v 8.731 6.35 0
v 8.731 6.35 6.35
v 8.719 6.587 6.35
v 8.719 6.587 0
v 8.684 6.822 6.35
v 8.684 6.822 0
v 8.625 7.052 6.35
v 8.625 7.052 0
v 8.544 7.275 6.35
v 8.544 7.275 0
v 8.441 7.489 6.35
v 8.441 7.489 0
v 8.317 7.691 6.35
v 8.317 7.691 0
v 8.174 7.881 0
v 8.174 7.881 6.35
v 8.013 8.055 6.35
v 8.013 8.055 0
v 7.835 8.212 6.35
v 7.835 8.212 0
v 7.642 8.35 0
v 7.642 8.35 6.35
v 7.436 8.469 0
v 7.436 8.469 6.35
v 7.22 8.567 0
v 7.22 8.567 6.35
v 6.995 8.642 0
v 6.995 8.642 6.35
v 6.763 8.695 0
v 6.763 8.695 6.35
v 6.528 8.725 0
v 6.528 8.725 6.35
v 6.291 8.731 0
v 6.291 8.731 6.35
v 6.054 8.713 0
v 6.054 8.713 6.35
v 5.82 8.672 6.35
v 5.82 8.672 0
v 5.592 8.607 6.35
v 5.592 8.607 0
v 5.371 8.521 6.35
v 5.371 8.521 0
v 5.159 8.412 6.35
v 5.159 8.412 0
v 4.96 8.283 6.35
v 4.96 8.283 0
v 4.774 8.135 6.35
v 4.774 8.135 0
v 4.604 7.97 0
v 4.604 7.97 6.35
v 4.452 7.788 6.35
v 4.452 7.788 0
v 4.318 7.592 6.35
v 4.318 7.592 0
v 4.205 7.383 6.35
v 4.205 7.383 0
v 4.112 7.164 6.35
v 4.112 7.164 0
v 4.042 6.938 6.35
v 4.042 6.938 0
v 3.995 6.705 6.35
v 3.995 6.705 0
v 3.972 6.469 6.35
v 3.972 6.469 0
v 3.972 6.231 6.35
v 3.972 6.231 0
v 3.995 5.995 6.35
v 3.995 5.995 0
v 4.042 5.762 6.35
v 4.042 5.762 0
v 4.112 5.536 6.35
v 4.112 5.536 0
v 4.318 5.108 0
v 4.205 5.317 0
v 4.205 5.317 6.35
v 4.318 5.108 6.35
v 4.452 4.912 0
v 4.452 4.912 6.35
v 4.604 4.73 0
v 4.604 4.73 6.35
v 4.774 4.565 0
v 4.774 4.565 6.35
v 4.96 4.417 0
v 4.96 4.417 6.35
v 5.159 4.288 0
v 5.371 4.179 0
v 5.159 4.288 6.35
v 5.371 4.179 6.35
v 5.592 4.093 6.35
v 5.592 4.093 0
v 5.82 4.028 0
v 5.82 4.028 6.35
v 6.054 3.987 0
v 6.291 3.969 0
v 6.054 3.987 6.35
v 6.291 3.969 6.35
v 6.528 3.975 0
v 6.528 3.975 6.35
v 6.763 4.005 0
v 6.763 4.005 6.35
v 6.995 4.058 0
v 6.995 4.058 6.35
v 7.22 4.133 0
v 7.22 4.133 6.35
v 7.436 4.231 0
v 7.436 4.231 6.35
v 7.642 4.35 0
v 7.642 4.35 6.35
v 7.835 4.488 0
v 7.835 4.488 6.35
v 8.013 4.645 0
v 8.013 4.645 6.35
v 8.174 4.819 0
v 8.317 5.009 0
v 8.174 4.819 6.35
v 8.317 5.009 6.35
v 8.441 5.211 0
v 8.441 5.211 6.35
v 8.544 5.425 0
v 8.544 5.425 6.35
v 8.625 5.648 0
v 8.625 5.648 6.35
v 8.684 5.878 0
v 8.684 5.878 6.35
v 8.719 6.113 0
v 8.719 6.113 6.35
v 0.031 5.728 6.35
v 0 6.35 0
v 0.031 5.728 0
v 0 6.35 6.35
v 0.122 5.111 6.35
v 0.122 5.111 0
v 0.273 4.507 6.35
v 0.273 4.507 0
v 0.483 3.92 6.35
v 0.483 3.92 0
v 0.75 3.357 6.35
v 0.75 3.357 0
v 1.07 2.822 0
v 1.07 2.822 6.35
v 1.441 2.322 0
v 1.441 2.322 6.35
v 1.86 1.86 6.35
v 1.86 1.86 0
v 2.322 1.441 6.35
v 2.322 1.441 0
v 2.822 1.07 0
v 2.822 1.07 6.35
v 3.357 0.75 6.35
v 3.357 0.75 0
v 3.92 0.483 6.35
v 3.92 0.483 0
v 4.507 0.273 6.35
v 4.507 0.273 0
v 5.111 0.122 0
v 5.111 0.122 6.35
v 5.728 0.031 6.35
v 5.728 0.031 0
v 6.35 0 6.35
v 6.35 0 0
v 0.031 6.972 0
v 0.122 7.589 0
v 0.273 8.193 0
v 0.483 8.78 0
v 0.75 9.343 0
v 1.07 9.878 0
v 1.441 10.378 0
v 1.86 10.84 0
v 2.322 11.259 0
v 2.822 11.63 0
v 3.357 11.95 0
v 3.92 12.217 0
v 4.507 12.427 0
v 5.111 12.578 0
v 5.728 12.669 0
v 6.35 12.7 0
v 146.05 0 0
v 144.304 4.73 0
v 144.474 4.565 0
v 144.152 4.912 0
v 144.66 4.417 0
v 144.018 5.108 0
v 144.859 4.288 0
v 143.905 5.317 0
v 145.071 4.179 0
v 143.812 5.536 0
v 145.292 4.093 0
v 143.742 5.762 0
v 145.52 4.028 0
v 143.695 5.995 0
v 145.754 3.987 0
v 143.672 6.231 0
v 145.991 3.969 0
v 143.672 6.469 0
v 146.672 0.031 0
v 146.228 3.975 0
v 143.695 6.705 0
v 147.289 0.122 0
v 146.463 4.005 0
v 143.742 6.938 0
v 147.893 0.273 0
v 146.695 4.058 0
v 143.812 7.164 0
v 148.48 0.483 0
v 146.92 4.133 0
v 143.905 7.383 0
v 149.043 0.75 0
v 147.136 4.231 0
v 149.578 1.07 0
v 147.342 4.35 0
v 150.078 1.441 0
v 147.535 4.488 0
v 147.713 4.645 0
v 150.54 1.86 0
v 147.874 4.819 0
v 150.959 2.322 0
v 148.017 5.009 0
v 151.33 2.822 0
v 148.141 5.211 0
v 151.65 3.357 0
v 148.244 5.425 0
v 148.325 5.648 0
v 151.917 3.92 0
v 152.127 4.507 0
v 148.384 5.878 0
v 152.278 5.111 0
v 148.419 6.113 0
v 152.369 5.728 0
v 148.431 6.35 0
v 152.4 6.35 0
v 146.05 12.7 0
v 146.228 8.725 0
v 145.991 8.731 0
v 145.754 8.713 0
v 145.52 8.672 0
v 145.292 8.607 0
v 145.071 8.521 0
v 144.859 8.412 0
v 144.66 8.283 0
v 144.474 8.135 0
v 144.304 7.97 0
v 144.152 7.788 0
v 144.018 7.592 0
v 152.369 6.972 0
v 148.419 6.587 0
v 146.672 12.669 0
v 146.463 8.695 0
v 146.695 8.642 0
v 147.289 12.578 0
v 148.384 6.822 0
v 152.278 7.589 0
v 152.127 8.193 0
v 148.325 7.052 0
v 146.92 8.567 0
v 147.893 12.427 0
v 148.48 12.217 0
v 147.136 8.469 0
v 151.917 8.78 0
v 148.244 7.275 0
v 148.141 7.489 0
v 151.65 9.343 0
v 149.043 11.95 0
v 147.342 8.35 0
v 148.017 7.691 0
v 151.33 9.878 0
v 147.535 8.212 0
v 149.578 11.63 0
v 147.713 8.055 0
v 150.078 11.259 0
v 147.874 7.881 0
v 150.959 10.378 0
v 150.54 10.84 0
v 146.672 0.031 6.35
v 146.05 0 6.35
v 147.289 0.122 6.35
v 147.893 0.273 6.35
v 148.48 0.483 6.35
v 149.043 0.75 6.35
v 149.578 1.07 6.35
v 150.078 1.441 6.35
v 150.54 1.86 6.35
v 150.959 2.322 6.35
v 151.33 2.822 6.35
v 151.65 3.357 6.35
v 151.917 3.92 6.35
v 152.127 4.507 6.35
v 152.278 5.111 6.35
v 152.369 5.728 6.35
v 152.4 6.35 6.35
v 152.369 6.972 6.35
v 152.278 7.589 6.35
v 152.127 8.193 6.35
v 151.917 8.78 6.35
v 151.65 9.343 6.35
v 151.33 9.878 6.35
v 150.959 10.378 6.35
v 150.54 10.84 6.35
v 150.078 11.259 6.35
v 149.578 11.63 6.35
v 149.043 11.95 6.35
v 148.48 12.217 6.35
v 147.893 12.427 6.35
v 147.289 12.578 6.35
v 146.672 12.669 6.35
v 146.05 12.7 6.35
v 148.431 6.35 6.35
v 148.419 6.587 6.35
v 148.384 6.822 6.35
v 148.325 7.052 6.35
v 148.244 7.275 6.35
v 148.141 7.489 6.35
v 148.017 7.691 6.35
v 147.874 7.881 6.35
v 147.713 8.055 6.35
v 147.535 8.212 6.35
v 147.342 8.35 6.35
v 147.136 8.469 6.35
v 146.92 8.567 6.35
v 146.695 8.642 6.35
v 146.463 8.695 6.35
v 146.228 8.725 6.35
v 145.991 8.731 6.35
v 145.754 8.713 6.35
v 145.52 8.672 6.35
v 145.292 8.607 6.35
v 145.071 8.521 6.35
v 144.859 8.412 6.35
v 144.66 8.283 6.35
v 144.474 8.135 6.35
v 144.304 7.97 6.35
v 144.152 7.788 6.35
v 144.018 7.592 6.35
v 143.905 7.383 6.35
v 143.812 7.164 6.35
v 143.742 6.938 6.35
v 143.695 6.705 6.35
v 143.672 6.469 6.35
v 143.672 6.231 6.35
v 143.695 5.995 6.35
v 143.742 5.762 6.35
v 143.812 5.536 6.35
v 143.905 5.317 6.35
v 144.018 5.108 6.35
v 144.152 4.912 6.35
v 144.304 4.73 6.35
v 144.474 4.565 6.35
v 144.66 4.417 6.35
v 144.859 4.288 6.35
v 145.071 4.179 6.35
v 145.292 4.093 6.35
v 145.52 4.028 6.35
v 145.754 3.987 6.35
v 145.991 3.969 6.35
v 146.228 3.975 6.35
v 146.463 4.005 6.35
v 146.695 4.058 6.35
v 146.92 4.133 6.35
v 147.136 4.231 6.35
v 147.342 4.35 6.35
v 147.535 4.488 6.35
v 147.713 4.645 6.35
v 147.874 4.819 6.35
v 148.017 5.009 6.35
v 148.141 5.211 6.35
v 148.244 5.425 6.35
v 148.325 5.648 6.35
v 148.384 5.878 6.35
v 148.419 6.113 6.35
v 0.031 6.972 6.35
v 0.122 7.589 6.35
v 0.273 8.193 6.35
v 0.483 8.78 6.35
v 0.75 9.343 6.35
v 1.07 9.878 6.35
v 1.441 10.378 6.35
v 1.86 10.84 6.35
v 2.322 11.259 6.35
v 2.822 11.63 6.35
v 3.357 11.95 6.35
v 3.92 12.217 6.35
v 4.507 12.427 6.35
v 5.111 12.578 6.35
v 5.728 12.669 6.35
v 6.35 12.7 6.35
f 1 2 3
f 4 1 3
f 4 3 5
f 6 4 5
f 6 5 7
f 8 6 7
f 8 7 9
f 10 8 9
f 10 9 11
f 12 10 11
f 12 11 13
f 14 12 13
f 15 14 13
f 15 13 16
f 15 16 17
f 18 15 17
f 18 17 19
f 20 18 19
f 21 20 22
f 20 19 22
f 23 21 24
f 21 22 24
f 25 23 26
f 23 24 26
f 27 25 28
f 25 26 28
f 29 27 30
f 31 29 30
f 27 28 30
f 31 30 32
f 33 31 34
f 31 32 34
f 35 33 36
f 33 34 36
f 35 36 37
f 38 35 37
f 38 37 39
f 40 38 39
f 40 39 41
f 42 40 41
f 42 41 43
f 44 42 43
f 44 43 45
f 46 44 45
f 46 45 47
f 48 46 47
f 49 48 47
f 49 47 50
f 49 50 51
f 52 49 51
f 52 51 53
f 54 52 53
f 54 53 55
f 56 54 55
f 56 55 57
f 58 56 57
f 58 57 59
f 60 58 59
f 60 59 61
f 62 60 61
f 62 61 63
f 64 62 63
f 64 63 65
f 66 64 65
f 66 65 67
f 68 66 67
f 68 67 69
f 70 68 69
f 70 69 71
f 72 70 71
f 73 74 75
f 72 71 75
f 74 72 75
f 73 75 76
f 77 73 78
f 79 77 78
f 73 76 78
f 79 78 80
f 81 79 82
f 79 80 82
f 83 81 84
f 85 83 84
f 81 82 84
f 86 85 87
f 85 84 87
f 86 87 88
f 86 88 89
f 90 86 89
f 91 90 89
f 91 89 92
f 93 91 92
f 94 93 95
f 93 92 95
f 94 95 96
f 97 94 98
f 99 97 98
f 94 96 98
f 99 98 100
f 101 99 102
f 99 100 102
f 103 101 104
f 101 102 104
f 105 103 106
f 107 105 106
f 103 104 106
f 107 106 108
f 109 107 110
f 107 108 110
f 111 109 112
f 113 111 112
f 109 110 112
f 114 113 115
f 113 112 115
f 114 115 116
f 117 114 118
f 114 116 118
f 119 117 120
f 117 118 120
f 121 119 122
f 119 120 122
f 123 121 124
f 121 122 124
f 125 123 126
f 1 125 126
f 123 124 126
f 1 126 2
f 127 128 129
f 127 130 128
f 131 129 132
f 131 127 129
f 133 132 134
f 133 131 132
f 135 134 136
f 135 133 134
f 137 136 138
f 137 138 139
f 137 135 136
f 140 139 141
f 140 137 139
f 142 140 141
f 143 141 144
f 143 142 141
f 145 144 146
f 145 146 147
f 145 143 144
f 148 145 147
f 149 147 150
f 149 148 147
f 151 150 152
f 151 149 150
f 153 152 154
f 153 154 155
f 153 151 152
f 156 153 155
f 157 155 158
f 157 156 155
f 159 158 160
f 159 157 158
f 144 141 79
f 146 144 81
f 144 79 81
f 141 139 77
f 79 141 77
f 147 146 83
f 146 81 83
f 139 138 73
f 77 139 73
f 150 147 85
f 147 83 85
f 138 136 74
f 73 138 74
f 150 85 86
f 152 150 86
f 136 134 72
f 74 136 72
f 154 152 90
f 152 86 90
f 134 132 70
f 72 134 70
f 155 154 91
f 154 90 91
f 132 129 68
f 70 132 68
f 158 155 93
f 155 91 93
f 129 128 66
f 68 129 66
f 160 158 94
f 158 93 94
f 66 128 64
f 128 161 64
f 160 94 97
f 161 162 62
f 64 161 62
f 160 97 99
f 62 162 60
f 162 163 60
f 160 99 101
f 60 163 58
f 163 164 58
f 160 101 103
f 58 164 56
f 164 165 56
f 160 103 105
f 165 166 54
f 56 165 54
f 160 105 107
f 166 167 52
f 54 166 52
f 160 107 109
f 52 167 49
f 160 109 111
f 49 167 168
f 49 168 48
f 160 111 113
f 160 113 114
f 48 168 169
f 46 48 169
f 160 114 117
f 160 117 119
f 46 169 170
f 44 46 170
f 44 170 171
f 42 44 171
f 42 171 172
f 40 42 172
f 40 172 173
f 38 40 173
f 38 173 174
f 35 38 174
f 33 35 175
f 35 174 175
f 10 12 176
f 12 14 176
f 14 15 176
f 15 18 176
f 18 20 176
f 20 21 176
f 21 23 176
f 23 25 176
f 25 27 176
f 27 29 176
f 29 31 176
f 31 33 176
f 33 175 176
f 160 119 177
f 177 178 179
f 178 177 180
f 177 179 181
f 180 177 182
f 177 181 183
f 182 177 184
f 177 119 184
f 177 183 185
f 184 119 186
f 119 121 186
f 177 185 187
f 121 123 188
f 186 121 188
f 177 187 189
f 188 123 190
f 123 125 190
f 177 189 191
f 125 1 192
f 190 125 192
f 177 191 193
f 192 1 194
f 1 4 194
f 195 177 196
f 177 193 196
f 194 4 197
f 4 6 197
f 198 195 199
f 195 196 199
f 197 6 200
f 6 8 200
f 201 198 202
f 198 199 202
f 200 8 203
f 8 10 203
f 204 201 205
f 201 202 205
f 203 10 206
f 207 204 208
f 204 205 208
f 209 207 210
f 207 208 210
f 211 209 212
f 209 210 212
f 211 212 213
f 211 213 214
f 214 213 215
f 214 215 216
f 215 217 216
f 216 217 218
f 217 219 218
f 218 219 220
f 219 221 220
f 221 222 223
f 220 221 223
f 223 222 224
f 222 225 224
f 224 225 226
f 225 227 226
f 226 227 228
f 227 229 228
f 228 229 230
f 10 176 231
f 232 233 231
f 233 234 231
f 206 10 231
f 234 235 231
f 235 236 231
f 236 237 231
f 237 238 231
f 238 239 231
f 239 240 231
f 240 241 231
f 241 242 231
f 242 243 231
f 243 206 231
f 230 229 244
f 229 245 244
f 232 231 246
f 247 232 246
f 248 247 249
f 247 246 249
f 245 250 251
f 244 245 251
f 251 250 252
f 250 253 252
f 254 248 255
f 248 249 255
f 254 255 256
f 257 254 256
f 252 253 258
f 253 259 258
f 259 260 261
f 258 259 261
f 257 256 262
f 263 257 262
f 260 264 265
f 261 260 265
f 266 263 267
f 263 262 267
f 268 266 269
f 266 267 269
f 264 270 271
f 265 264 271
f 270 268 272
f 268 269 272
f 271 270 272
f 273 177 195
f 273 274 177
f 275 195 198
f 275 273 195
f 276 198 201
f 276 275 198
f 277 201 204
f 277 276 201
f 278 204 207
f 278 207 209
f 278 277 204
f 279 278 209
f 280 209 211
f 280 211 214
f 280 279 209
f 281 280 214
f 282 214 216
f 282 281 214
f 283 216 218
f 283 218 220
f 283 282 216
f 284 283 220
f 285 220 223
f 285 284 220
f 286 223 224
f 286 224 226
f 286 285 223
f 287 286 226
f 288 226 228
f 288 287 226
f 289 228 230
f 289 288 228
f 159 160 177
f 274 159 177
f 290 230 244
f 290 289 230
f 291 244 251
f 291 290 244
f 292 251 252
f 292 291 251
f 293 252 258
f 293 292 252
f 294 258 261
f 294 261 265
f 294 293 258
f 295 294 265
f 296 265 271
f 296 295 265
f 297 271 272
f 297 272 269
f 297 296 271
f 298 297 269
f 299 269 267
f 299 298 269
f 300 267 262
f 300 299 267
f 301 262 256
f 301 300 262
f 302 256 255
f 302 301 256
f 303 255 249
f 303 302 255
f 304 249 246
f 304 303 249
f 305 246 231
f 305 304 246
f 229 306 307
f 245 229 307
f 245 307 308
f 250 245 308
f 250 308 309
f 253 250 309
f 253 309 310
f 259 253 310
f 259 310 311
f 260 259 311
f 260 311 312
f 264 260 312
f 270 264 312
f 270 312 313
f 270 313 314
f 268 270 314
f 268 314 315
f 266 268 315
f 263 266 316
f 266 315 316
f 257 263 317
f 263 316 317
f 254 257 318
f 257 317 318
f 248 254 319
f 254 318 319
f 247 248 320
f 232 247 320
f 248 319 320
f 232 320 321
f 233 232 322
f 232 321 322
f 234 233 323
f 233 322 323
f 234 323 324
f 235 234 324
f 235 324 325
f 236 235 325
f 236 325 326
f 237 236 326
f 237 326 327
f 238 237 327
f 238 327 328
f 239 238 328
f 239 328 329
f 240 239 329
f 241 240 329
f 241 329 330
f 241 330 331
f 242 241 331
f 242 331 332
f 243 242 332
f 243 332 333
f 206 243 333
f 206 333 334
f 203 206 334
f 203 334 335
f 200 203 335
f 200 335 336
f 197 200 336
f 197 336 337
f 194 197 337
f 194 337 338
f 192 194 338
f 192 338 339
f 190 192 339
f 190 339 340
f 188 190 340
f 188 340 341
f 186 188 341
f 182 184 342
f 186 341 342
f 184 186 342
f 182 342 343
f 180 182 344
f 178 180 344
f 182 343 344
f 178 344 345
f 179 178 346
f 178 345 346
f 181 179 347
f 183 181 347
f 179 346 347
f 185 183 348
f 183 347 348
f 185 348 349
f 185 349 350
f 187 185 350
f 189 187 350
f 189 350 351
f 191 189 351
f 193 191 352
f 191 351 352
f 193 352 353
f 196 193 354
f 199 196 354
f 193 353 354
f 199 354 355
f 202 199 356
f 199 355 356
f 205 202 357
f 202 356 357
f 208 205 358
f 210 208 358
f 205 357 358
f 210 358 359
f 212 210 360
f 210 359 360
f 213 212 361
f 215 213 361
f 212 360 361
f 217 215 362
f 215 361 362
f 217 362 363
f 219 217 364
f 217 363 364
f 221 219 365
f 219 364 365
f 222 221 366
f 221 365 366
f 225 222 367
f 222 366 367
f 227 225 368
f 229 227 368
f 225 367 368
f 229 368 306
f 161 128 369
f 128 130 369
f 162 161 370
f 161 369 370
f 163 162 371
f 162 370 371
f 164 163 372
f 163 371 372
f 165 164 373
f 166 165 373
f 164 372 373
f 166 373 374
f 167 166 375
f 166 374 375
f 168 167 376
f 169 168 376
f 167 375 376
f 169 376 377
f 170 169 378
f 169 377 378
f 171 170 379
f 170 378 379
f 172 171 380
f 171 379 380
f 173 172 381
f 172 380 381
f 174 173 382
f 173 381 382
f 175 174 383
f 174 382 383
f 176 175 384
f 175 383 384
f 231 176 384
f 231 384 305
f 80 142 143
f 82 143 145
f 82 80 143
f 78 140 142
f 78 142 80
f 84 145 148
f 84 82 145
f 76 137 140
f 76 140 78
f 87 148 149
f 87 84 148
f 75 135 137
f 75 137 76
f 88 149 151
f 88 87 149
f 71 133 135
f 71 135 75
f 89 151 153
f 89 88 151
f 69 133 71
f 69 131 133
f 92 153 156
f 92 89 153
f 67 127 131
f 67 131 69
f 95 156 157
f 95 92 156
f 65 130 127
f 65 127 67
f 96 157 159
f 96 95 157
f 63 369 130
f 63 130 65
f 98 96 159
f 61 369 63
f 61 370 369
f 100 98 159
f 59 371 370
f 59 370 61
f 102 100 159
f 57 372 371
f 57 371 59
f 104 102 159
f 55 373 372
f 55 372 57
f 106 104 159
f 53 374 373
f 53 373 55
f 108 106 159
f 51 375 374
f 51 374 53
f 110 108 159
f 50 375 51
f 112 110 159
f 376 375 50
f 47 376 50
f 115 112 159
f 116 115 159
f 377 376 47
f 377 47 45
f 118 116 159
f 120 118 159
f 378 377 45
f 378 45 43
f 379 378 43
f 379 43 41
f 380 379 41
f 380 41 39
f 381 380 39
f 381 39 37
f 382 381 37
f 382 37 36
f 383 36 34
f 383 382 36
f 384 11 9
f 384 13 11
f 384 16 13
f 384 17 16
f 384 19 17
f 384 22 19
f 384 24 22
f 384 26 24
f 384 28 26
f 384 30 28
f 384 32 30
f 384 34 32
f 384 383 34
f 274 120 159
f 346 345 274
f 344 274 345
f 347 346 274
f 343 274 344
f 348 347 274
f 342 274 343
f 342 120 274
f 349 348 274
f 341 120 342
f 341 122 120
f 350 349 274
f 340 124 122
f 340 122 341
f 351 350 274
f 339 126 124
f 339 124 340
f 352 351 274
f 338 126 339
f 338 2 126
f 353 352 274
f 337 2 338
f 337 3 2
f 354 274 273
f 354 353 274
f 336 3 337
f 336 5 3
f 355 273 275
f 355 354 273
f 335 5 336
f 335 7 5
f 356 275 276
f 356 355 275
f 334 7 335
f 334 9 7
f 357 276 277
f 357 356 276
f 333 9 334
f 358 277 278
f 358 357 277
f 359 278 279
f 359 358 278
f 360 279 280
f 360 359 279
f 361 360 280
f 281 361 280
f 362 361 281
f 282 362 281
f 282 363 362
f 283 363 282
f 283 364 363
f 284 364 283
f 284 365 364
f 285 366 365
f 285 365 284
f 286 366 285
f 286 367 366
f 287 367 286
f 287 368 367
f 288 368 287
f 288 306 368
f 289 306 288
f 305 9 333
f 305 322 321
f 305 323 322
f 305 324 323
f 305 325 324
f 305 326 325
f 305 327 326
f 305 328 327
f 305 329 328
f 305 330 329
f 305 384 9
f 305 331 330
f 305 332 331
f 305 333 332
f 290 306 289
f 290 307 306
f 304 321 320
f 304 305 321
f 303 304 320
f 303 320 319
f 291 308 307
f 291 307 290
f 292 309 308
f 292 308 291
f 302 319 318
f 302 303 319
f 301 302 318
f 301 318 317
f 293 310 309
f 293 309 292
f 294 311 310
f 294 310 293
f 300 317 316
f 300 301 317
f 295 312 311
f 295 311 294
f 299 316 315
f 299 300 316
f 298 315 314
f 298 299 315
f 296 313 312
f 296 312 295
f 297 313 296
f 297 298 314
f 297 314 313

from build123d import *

# Parameters (mm, degrees)
SKETCH1_W           = 152.4
SKETCH1_H           = 12.7
BOSS_EXTRUDE1_DEPTH = 6.35
FILLET1_R           = 6.35
SKETCH2_R           = 2.38125
CUT_EXTRUDE1_DEPTH  = 25.4


with BuildPart() as part:
    # Sketch1 → Boss-Extrude1 (new body)
    with BuildSketch(Plane.XY):
        with Locations((76.2, 6.35)):
            Rectangle(SKETCH1_W, SKETCH1_H)
    extrude(amount=BOSS_EXTRUDE1_DEPTH)

    # Fillet1
    fillet1_edges = [part.edges().sort_by_distance(p)[0] for p in [
        (0, 0, 3.175),
        (0, 12.7, 3.175),
        (152.4, 0, 3.175),
        (152.4, 12.7, 3.175),
    ]]
    fillet(fillet1_edges, radius=FILLET1_R - 0.0001)  # a hair under: the kernel refuses the full size

    # Sketch2 → Cut-Extrude1 (cut)
    with BuildSketch(Plane.XY.offset(6.35)):
        with Locations((6.35, 6.35)):
            Circle(SKETCH2_R)
        with Locations((146.05, 6.35)):
            Circle(SKETCH2_R)
    extrude(amount=-CUT_EXTRUDE1_DEPTH, mode=Mode.SUBTRACT)


solid = part.part
